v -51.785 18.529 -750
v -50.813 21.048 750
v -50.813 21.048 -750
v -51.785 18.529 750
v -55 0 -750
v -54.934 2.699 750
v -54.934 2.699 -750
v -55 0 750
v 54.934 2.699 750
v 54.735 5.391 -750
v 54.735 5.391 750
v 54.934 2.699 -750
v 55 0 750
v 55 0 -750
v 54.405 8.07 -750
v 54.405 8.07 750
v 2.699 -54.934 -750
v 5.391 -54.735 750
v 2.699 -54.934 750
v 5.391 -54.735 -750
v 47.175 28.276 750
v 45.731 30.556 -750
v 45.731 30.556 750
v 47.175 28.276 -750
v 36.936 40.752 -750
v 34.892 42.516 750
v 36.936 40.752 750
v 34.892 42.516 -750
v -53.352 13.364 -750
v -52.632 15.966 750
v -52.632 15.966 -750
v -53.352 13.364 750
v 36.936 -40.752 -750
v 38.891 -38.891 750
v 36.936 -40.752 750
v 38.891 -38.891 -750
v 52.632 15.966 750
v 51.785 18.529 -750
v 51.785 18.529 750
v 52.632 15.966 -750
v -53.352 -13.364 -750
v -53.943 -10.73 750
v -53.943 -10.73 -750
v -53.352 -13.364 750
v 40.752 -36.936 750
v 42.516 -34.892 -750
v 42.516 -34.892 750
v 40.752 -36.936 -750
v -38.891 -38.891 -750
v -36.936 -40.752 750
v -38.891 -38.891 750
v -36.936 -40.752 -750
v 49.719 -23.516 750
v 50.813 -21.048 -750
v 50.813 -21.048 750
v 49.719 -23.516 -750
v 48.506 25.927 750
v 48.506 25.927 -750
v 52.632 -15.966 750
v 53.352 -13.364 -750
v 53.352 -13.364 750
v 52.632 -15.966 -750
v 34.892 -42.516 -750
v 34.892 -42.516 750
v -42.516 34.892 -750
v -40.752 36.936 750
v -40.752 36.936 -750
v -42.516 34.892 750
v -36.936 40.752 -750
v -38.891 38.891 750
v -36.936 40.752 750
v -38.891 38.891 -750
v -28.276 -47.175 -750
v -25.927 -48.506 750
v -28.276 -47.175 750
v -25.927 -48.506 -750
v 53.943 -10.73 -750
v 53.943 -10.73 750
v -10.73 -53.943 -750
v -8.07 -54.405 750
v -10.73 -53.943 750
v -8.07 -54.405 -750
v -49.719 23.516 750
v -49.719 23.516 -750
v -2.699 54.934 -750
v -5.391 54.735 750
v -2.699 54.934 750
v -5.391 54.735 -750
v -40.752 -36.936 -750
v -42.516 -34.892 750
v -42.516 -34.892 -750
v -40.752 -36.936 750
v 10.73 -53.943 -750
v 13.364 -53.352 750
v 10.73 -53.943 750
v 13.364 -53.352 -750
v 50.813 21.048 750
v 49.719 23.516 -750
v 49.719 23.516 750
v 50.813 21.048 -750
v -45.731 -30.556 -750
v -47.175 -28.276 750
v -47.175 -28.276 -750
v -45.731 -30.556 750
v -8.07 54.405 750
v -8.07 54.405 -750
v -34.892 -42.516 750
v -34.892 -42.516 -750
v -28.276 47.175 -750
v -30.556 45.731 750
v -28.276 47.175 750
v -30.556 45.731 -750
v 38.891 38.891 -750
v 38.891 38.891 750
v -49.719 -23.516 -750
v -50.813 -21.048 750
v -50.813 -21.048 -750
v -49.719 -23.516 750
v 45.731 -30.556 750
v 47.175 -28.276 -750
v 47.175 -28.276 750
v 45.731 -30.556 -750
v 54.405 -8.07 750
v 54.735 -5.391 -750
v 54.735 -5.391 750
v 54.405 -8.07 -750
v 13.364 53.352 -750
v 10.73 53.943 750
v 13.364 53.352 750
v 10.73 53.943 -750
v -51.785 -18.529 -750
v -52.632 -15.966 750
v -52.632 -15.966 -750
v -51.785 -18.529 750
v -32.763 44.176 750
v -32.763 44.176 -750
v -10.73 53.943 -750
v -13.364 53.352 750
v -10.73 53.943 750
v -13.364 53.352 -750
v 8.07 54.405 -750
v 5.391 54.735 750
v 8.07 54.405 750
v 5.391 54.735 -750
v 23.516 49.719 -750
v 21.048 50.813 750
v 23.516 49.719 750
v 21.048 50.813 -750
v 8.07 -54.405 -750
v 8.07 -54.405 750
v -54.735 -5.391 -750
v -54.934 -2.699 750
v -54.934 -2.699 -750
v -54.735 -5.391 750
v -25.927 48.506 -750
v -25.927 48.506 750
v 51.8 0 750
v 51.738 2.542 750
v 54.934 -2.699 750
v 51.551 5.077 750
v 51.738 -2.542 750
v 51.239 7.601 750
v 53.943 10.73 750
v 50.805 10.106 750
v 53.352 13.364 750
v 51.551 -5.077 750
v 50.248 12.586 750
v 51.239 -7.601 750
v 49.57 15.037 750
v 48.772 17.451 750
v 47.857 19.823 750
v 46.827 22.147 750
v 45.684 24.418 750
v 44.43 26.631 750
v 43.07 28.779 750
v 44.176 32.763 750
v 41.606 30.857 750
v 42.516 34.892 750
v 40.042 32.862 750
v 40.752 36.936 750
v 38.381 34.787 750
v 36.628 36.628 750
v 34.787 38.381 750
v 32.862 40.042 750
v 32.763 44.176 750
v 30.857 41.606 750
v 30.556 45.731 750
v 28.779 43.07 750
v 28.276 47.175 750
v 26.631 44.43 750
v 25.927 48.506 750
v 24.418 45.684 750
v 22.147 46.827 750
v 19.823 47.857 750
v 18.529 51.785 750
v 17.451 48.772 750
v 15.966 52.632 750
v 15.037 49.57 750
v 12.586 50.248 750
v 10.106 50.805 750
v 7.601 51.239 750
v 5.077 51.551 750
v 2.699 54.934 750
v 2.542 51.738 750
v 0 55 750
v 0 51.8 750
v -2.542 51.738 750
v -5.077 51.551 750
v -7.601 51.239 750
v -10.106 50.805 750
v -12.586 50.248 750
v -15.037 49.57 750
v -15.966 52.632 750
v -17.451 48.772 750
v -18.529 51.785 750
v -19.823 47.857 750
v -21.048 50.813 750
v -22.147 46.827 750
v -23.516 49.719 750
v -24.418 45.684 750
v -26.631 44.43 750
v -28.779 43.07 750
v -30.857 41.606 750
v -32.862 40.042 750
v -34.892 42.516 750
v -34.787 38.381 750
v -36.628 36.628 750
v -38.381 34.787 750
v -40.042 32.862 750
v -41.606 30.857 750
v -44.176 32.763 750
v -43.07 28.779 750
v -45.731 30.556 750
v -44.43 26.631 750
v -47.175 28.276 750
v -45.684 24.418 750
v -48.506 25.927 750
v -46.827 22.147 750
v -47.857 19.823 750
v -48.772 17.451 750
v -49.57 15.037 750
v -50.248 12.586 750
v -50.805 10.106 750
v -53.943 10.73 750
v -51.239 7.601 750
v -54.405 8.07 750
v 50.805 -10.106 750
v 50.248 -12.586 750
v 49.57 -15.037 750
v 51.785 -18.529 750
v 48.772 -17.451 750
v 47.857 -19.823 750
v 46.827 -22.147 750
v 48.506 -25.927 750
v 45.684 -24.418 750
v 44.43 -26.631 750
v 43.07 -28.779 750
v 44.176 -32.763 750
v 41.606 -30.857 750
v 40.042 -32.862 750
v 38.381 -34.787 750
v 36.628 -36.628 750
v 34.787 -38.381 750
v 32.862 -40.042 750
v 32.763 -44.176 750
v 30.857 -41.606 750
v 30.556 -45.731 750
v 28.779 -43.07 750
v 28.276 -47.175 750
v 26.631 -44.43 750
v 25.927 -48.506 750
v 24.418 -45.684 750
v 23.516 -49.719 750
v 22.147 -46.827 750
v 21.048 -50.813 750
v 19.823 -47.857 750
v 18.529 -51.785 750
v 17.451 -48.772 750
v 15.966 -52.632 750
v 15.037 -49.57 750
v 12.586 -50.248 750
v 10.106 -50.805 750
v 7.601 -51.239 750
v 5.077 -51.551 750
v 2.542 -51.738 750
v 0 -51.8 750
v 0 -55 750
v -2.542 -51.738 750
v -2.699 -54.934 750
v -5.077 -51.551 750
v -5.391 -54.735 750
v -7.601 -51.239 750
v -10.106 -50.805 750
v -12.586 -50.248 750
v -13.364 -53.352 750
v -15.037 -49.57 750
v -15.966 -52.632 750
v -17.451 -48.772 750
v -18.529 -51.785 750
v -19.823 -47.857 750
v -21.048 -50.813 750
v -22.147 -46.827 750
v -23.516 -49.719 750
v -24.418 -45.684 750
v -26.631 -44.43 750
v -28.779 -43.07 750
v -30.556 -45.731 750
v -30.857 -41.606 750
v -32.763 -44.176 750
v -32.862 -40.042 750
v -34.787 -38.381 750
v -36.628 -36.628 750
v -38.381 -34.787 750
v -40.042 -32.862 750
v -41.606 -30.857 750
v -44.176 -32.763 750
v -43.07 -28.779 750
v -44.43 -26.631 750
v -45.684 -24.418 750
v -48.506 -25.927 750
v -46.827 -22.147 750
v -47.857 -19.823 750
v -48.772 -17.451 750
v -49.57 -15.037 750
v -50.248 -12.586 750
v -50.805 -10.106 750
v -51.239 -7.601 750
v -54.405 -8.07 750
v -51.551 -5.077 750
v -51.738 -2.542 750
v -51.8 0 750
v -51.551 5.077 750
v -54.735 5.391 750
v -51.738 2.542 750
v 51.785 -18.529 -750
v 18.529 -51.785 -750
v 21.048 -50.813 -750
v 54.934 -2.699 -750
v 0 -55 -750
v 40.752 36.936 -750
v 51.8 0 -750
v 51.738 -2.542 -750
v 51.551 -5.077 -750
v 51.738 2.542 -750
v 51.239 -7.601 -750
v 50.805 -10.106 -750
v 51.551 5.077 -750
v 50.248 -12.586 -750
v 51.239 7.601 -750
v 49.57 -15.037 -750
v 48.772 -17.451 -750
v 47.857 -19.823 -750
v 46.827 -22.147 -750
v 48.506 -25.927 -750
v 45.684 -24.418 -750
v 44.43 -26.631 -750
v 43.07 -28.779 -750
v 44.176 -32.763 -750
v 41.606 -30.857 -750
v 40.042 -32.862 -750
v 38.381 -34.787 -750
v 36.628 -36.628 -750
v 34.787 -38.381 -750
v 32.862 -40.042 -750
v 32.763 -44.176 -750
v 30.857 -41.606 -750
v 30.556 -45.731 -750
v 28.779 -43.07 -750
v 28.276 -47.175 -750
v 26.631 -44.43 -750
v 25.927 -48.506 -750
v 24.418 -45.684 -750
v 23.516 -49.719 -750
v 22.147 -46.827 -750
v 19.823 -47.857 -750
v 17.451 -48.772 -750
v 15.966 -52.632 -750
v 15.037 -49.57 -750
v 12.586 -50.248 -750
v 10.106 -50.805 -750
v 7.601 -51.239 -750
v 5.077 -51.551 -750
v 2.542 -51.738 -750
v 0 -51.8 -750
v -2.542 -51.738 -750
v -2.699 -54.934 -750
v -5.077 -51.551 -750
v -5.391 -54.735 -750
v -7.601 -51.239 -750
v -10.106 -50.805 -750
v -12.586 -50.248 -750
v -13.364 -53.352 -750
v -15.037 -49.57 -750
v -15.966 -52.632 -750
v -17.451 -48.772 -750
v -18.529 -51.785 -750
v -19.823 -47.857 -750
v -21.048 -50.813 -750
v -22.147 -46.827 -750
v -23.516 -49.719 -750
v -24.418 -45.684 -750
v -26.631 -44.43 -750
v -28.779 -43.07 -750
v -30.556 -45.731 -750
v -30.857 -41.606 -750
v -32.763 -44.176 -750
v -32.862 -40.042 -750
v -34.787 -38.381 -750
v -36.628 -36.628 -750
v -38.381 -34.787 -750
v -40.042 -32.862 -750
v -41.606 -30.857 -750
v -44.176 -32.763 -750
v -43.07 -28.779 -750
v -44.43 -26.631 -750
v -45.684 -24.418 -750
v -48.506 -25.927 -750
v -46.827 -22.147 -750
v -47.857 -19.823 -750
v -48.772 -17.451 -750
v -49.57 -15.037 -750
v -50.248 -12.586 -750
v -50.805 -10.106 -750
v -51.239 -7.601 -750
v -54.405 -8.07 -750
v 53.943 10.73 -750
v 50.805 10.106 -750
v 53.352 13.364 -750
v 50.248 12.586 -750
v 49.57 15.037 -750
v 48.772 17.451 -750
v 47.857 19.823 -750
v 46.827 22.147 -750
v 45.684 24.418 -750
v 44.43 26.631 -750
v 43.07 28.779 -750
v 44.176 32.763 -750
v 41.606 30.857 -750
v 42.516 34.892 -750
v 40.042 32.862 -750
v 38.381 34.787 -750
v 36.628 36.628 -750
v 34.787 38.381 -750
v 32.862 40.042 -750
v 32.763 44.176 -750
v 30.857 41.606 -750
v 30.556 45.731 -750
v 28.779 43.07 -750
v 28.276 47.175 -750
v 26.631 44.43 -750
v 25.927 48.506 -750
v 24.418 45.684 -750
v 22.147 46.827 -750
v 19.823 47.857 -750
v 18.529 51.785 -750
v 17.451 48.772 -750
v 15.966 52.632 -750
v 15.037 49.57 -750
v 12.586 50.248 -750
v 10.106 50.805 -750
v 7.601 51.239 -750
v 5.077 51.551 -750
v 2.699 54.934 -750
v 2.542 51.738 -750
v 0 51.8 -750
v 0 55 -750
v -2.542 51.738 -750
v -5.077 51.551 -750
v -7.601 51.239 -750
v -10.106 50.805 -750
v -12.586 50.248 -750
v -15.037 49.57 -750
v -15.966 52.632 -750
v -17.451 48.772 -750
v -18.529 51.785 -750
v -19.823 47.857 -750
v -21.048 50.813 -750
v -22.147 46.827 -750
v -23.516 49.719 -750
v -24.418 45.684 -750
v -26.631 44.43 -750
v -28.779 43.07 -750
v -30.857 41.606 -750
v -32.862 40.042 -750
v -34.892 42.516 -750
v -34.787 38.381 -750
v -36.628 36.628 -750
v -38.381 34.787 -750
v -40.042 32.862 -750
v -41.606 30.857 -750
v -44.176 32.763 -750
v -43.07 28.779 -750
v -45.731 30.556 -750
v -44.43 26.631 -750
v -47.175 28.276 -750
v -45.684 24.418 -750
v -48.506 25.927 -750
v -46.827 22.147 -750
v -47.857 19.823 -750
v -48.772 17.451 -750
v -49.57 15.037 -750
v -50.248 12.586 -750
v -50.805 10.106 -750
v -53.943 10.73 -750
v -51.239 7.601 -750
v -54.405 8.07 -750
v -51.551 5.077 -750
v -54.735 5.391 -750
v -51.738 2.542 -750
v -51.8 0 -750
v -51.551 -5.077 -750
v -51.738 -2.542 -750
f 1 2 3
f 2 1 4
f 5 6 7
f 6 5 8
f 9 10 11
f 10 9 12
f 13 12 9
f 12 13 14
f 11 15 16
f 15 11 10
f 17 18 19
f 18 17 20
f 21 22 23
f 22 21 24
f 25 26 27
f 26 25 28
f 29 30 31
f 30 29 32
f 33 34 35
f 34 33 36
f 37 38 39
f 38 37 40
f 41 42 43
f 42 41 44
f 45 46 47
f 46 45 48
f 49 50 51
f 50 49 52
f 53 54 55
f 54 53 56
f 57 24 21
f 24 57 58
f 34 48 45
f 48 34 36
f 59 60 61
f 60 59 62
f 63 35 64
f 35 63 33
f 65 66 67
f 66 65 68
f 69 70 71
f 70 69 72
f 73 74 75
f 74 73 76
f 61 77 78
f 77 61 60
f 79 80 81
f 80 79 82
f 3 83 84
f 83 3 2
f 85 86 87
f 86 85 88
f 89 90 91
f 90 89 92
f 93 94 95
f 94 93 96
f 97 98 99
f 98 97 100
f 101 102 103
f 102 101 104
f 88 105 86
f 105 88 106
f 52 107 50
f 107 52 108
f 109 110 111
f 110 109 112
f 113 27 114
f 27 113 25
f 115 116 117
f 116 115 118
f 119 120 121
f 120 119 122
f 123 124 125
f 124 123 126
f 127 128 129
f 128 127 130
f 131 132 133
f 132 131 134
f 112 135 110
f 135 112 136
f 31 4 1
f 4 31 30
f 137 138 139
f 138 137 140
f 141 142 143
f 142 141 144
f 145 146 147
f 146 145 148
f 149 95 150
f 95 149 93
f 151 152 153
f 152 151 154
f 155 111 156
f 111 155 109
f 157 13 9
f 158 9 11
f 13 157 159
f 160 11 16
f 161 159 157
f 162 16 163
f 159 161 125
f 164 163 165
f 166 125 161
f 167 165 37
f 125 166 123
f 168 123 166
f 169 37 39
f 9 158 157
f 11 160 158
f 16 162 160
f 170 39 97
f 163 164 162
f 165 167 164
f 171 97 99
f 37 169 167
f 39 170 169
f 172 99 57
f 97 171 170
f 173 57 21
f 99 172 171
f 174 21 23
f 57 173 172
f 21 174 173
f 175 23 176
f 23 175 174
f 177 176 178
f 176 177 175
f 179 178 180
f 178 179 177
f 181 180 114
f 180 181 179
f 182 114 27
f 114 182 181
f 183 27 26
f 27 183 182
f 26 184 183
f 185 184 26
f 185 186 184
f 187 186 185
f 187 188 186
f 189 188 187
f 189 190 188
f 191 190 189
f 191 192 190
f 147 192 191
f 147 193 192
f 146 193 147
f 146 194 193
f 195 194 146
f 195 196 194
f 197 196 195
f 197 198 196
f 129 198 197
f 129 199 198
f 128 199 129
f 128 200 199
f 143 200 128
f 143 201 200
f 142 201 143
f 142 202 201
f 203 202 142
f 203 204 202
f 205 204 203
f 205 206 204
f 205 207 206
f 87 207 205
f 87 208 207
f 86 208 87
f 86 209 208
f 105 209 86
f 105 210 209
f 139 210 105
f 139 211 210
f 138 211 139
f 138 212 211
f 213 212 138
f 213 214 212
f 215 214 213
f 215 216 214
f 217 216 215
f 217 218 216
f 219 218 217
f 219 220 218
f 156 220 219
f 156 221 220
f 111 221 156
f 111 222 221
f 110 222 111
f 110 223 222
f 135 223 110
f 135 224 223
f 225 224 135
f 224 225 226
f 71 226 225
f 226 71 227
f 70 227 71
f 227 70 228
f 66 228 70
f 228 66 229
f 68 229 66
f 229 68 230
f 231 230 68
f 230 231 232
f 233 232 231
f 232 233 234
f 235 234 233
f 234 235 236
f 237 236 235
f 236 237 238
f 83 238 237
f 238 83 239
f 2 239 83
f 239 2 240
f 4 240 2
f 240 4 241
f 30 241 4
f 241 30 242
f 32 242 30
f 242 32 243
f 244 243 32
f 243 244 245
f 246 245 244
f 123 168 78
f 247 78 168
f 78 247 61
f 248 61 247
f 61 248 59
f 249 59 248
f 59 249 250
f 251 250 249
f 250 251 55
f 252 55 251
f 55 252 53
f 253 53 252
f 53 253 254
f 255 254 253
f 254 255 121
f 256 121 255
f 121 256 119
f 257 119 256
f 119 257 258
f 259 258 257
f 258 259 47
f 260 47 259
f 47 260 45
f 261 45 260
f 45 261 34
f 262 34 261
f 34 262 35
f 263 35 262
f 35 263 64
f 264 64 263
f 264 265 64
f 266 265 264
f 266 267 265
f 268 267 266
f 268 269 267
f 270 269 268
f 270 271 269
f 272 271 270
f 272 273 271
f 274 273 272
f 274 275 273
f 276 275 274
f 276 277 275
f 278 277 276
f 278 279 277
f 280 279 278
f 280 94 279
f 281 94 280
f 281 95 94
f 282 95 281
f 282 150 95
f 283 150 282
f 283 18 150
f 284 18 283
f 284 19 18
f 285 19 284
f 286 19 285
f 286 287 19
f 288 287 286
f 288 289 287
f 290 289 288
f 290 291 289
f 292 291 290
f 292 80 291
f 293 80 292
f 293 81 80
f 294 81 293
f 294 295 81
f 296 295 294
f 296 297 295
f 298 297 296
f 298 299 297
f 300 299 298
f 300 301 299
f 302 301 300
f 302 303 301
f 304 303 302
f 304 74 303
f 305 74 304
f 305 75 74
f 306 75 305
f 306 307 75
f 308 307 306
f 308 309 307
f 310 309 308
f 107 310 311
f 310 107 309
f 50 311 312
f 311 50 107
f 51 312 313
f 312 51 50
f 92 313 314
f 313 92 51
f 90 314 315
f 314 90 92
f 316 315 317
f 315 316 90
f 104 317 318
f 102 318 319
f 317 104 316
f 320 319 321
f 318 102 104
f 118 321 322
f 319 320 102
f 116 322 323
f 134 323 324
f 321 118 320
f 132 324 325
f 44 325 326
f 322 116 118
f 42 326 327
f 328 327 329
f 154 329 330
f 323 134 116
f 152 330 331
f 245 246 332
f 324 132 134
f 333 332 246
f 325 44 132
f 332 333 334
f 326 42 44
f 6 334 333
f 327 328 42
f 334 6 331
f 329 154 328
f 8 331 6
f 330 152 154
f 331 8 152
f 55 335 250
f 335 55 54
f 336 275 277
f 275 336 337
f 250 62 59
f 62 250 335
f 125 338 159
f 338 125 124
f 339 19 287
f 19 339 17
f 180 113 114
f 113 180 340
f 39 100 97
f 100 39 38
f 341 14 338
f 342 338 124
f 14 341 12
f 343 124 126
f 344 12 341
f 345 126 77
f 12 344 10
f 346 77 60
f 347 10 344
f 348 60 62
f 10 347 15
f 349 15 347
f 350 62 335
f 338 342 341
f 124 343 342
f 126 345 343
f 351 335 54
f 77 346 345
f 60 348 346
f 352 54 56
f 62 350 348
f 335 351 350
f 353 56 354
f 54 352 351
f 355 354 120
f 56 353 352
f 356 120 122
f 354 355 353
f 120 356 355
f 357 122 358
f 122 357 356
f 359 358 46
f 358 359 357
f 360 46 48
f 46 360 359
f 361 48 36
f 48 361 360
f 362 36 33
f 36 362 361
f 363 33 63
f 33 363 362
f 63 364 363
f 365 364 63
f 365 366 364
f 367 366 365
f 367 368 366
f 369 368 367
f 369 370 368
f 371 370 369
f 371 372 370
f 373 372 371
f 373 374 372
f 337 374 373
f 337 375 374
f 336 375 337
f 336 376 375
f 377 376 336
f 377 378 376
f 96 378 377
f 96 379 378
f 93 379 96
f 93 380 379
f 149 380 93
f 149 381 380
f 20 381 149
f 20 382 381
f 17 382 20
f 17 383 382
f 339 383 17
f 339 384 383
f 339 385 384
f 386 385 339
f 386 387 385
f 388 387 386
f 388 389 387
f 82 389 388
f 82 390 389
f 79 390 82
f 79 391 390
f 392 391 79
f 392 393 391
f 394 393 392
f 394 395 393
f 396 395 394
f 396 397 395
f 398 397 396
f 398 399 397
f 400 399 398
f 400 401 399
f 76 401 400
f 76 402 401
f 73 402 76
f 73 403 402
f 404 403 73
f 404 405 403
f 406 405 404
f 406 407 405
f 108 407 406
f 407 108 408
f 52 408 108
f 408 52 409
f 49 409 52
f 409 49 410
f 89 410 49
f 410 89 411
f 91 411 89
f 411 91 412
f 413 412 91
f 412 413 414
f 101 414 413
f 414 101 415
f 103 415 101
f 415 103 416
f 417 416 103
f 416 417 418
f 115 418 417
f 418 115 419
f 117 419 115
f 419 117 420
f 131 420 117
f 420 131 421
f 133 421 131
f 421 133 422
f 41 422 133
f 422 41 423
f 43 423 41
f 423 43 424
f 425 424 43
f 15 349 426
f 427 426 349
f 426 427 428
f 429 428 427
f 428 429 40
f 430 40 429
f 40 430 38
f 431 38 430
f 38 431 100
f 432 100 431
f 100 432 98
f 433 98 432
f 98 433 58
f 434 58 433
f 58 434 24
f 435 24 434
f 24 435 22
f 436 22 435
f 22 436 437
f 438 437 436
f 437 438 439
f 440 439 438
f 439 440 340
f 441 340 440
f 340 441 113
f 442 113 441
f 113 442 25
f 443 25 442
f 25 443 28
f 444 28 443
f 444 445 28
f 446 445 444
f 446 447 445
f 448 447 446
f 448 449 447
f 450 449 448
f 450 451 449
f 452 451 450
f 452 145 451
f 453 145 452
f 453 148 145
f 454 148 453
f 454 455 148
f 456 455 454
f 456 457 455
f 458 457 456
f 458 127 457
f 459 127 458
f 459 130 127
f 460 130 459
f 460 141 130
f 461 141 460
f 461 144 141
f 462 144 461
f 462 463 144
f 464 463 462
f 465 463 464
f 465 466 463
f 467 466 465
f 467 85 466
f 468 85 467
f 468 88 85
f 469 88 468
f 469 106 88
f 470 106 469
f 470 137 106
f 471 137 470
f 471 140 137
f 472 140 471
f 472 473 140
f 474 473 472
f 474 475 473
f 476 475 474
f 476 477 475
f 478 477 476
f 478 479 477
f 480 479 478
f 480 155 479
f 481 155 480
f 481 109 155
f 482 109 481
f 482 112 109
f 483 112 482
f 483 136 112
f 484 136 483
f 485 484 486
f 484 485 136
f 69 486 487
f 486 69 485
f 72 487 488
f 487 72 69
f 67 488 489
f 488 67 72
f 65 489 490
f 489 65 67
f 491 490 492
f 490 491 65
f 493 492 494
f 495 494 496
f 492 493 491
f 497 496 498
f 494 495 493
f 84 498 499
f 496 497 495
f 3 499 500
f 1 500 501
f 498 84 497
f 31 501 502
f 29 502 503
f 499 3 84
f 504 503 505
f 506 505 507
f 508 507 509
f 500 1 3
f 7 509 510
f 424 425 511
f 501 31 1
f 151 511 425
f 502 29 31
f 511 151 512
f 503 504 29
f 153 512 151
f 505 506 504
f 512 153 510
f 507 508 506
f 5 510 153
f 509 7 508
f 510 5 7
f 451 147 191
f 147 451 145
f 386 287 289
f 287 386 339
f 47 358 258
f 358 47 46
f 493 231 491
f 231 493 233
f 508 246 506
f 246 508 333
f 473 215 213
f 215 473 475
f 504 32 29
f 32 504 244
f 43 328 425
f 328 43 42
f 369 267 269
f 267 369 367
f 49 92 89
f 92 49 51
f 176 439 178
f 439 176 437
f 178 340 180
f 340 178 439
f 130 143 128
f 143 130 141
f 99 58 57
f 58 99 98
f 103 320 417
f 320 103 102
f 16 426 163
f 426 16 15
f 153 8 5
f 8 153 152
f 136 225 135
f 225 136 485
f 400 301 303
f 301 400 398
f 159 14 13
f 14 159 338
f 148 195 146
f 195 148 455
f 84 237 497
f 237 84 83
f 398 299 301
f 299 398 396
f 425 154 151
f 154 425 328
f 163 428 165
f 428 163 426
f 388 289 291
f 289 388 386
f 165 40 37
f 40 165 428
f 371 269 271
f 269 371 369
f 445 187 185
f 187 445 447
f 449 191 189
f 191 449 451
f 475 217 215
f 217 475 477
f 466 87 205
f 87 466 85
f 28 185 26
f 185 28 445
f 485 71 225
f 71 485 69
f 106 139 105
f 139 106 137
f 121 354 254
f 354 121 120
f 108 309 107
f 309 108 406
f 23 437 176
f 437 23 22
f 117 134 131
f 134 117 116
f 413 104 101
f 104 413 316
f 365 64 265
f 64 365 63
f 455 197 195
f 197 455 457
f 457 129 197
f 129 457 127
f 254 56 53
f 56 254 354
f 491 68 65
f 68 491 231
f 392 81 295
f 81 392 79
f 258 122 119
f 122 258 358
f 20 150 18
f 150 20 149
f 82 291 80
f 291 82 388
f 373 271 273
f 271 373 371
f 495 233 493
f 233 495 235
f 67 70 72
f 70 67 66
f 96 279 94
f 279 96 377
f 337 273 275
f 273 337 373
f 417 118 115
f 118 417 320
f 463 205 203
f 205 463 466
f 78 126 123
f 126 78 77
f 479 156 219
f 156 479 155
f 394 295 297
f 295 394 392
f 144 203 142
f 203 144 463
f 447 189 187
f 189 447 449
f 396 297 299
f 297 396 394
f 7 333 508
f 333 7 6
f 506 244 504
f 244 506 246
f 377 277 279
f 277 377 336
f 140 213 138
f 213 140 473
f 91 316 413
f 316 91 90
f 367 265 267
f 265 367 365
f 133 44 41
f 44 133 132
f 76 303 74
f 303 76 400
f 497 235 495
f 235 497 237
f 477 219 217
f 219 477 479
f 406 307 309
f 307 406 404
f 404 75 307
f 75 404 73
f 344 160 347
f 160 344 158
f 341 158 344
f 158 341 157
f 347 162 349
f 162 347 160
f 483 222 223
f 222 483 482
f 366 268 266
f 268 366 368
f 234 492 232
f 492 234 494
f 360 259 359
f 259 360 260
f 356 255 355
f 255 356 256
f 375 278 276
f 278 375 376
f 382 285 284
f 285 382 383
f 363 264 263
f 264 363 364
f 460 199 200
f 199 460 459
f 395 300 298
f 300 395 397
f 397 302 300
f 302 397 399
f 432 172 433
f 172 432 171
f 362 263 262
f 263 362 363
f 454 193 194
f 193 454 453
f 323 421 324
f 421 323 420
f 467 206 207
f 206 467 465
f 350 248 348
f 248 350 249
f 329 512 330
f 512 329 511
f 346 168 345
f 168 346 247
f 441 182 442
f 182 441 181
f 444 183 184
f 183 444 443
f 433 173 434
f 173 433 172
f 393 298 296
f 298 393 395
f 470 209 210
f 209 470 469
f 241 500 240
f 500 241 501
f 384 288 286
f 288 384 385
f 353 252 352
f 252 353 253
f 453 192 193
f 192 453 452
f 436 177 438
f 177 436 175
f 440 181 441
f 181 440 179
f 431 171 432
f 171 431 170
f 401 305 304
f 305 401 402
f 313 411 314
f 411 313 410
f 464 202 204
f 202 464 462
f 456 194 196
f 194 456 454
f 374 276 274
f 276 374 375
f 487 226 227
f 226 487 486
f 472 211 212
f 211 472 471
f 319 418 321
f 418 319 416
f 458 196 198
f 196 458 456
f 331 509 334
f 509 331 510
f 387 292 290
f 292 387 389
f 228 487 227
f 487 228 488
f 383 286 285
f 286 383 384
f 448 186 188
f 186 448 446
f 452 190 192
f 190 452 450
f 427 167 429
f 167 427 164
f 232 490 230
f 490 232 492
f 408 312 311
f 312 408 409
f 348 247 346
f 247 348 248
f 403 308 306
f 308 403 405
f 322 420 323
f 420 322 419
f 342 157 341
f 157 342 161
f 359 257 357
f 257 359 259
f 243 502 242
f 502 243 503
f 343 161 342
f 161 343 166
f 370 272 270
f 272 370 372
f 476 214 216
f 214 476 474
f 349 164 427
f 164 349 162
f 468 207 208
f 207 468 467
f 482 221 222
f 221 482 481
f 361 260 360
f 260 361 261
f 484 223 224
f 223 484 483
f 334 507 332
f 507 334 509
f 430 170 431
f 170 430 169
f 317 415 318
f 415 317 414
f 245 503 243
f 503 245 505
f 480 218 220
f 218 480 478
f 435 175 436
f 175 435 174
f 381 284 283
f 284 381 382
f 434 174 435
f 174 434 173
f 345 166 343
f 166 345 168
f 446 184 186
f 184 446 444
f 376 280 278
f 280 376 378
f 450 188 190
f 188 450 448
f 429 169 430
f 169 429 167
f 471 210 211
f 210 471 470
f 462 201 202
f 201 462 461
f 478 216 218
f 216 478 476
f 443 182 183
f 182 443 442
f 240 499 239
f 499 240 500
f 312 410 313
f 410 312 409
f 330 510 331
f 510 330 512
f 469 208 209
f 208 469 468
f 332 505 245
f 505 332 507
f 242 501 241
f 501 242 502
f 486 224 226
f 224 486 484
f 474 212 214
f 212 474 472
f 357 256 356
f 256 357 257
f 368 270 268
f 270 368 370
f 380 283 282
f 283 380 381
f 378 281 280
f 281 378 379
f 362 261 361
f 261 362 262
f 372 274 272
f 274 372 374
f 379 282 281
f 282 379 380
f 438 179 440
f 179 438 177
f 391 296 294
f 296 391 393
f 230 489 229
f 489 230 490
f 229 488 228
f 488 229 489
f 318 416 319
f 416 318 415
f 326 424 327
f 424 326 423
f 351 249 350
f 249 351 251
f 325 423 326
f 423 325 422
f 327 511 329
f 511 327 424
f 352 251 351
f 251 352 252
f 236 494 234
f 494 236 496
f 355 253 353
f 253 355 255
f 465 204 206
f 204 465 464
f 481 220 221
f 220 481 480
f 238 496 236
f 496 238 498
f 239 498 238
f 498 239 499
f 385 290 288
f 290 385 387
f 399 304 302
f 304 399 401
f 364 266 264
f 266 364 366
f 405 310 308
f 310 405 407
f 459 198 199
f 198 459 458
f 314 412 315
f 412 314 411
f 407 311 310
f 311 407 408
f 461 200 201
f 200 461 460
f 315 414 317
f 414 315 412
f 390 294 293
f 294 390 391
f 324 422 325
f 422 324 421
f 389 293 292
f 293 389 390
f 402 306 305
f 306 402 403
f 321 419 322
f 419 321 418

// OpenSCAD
$fn=128;

module ht_pipe(od=110, length=1500, wall=3.2) {
    id = od - 2*wall;
    difference() {
        cylinder(h=length, d=od, center=true);
        cylinder(h=length+2, d=id, center=true);
    }
}

ht_pipe(od=110, length=1500, wall=3.2);
